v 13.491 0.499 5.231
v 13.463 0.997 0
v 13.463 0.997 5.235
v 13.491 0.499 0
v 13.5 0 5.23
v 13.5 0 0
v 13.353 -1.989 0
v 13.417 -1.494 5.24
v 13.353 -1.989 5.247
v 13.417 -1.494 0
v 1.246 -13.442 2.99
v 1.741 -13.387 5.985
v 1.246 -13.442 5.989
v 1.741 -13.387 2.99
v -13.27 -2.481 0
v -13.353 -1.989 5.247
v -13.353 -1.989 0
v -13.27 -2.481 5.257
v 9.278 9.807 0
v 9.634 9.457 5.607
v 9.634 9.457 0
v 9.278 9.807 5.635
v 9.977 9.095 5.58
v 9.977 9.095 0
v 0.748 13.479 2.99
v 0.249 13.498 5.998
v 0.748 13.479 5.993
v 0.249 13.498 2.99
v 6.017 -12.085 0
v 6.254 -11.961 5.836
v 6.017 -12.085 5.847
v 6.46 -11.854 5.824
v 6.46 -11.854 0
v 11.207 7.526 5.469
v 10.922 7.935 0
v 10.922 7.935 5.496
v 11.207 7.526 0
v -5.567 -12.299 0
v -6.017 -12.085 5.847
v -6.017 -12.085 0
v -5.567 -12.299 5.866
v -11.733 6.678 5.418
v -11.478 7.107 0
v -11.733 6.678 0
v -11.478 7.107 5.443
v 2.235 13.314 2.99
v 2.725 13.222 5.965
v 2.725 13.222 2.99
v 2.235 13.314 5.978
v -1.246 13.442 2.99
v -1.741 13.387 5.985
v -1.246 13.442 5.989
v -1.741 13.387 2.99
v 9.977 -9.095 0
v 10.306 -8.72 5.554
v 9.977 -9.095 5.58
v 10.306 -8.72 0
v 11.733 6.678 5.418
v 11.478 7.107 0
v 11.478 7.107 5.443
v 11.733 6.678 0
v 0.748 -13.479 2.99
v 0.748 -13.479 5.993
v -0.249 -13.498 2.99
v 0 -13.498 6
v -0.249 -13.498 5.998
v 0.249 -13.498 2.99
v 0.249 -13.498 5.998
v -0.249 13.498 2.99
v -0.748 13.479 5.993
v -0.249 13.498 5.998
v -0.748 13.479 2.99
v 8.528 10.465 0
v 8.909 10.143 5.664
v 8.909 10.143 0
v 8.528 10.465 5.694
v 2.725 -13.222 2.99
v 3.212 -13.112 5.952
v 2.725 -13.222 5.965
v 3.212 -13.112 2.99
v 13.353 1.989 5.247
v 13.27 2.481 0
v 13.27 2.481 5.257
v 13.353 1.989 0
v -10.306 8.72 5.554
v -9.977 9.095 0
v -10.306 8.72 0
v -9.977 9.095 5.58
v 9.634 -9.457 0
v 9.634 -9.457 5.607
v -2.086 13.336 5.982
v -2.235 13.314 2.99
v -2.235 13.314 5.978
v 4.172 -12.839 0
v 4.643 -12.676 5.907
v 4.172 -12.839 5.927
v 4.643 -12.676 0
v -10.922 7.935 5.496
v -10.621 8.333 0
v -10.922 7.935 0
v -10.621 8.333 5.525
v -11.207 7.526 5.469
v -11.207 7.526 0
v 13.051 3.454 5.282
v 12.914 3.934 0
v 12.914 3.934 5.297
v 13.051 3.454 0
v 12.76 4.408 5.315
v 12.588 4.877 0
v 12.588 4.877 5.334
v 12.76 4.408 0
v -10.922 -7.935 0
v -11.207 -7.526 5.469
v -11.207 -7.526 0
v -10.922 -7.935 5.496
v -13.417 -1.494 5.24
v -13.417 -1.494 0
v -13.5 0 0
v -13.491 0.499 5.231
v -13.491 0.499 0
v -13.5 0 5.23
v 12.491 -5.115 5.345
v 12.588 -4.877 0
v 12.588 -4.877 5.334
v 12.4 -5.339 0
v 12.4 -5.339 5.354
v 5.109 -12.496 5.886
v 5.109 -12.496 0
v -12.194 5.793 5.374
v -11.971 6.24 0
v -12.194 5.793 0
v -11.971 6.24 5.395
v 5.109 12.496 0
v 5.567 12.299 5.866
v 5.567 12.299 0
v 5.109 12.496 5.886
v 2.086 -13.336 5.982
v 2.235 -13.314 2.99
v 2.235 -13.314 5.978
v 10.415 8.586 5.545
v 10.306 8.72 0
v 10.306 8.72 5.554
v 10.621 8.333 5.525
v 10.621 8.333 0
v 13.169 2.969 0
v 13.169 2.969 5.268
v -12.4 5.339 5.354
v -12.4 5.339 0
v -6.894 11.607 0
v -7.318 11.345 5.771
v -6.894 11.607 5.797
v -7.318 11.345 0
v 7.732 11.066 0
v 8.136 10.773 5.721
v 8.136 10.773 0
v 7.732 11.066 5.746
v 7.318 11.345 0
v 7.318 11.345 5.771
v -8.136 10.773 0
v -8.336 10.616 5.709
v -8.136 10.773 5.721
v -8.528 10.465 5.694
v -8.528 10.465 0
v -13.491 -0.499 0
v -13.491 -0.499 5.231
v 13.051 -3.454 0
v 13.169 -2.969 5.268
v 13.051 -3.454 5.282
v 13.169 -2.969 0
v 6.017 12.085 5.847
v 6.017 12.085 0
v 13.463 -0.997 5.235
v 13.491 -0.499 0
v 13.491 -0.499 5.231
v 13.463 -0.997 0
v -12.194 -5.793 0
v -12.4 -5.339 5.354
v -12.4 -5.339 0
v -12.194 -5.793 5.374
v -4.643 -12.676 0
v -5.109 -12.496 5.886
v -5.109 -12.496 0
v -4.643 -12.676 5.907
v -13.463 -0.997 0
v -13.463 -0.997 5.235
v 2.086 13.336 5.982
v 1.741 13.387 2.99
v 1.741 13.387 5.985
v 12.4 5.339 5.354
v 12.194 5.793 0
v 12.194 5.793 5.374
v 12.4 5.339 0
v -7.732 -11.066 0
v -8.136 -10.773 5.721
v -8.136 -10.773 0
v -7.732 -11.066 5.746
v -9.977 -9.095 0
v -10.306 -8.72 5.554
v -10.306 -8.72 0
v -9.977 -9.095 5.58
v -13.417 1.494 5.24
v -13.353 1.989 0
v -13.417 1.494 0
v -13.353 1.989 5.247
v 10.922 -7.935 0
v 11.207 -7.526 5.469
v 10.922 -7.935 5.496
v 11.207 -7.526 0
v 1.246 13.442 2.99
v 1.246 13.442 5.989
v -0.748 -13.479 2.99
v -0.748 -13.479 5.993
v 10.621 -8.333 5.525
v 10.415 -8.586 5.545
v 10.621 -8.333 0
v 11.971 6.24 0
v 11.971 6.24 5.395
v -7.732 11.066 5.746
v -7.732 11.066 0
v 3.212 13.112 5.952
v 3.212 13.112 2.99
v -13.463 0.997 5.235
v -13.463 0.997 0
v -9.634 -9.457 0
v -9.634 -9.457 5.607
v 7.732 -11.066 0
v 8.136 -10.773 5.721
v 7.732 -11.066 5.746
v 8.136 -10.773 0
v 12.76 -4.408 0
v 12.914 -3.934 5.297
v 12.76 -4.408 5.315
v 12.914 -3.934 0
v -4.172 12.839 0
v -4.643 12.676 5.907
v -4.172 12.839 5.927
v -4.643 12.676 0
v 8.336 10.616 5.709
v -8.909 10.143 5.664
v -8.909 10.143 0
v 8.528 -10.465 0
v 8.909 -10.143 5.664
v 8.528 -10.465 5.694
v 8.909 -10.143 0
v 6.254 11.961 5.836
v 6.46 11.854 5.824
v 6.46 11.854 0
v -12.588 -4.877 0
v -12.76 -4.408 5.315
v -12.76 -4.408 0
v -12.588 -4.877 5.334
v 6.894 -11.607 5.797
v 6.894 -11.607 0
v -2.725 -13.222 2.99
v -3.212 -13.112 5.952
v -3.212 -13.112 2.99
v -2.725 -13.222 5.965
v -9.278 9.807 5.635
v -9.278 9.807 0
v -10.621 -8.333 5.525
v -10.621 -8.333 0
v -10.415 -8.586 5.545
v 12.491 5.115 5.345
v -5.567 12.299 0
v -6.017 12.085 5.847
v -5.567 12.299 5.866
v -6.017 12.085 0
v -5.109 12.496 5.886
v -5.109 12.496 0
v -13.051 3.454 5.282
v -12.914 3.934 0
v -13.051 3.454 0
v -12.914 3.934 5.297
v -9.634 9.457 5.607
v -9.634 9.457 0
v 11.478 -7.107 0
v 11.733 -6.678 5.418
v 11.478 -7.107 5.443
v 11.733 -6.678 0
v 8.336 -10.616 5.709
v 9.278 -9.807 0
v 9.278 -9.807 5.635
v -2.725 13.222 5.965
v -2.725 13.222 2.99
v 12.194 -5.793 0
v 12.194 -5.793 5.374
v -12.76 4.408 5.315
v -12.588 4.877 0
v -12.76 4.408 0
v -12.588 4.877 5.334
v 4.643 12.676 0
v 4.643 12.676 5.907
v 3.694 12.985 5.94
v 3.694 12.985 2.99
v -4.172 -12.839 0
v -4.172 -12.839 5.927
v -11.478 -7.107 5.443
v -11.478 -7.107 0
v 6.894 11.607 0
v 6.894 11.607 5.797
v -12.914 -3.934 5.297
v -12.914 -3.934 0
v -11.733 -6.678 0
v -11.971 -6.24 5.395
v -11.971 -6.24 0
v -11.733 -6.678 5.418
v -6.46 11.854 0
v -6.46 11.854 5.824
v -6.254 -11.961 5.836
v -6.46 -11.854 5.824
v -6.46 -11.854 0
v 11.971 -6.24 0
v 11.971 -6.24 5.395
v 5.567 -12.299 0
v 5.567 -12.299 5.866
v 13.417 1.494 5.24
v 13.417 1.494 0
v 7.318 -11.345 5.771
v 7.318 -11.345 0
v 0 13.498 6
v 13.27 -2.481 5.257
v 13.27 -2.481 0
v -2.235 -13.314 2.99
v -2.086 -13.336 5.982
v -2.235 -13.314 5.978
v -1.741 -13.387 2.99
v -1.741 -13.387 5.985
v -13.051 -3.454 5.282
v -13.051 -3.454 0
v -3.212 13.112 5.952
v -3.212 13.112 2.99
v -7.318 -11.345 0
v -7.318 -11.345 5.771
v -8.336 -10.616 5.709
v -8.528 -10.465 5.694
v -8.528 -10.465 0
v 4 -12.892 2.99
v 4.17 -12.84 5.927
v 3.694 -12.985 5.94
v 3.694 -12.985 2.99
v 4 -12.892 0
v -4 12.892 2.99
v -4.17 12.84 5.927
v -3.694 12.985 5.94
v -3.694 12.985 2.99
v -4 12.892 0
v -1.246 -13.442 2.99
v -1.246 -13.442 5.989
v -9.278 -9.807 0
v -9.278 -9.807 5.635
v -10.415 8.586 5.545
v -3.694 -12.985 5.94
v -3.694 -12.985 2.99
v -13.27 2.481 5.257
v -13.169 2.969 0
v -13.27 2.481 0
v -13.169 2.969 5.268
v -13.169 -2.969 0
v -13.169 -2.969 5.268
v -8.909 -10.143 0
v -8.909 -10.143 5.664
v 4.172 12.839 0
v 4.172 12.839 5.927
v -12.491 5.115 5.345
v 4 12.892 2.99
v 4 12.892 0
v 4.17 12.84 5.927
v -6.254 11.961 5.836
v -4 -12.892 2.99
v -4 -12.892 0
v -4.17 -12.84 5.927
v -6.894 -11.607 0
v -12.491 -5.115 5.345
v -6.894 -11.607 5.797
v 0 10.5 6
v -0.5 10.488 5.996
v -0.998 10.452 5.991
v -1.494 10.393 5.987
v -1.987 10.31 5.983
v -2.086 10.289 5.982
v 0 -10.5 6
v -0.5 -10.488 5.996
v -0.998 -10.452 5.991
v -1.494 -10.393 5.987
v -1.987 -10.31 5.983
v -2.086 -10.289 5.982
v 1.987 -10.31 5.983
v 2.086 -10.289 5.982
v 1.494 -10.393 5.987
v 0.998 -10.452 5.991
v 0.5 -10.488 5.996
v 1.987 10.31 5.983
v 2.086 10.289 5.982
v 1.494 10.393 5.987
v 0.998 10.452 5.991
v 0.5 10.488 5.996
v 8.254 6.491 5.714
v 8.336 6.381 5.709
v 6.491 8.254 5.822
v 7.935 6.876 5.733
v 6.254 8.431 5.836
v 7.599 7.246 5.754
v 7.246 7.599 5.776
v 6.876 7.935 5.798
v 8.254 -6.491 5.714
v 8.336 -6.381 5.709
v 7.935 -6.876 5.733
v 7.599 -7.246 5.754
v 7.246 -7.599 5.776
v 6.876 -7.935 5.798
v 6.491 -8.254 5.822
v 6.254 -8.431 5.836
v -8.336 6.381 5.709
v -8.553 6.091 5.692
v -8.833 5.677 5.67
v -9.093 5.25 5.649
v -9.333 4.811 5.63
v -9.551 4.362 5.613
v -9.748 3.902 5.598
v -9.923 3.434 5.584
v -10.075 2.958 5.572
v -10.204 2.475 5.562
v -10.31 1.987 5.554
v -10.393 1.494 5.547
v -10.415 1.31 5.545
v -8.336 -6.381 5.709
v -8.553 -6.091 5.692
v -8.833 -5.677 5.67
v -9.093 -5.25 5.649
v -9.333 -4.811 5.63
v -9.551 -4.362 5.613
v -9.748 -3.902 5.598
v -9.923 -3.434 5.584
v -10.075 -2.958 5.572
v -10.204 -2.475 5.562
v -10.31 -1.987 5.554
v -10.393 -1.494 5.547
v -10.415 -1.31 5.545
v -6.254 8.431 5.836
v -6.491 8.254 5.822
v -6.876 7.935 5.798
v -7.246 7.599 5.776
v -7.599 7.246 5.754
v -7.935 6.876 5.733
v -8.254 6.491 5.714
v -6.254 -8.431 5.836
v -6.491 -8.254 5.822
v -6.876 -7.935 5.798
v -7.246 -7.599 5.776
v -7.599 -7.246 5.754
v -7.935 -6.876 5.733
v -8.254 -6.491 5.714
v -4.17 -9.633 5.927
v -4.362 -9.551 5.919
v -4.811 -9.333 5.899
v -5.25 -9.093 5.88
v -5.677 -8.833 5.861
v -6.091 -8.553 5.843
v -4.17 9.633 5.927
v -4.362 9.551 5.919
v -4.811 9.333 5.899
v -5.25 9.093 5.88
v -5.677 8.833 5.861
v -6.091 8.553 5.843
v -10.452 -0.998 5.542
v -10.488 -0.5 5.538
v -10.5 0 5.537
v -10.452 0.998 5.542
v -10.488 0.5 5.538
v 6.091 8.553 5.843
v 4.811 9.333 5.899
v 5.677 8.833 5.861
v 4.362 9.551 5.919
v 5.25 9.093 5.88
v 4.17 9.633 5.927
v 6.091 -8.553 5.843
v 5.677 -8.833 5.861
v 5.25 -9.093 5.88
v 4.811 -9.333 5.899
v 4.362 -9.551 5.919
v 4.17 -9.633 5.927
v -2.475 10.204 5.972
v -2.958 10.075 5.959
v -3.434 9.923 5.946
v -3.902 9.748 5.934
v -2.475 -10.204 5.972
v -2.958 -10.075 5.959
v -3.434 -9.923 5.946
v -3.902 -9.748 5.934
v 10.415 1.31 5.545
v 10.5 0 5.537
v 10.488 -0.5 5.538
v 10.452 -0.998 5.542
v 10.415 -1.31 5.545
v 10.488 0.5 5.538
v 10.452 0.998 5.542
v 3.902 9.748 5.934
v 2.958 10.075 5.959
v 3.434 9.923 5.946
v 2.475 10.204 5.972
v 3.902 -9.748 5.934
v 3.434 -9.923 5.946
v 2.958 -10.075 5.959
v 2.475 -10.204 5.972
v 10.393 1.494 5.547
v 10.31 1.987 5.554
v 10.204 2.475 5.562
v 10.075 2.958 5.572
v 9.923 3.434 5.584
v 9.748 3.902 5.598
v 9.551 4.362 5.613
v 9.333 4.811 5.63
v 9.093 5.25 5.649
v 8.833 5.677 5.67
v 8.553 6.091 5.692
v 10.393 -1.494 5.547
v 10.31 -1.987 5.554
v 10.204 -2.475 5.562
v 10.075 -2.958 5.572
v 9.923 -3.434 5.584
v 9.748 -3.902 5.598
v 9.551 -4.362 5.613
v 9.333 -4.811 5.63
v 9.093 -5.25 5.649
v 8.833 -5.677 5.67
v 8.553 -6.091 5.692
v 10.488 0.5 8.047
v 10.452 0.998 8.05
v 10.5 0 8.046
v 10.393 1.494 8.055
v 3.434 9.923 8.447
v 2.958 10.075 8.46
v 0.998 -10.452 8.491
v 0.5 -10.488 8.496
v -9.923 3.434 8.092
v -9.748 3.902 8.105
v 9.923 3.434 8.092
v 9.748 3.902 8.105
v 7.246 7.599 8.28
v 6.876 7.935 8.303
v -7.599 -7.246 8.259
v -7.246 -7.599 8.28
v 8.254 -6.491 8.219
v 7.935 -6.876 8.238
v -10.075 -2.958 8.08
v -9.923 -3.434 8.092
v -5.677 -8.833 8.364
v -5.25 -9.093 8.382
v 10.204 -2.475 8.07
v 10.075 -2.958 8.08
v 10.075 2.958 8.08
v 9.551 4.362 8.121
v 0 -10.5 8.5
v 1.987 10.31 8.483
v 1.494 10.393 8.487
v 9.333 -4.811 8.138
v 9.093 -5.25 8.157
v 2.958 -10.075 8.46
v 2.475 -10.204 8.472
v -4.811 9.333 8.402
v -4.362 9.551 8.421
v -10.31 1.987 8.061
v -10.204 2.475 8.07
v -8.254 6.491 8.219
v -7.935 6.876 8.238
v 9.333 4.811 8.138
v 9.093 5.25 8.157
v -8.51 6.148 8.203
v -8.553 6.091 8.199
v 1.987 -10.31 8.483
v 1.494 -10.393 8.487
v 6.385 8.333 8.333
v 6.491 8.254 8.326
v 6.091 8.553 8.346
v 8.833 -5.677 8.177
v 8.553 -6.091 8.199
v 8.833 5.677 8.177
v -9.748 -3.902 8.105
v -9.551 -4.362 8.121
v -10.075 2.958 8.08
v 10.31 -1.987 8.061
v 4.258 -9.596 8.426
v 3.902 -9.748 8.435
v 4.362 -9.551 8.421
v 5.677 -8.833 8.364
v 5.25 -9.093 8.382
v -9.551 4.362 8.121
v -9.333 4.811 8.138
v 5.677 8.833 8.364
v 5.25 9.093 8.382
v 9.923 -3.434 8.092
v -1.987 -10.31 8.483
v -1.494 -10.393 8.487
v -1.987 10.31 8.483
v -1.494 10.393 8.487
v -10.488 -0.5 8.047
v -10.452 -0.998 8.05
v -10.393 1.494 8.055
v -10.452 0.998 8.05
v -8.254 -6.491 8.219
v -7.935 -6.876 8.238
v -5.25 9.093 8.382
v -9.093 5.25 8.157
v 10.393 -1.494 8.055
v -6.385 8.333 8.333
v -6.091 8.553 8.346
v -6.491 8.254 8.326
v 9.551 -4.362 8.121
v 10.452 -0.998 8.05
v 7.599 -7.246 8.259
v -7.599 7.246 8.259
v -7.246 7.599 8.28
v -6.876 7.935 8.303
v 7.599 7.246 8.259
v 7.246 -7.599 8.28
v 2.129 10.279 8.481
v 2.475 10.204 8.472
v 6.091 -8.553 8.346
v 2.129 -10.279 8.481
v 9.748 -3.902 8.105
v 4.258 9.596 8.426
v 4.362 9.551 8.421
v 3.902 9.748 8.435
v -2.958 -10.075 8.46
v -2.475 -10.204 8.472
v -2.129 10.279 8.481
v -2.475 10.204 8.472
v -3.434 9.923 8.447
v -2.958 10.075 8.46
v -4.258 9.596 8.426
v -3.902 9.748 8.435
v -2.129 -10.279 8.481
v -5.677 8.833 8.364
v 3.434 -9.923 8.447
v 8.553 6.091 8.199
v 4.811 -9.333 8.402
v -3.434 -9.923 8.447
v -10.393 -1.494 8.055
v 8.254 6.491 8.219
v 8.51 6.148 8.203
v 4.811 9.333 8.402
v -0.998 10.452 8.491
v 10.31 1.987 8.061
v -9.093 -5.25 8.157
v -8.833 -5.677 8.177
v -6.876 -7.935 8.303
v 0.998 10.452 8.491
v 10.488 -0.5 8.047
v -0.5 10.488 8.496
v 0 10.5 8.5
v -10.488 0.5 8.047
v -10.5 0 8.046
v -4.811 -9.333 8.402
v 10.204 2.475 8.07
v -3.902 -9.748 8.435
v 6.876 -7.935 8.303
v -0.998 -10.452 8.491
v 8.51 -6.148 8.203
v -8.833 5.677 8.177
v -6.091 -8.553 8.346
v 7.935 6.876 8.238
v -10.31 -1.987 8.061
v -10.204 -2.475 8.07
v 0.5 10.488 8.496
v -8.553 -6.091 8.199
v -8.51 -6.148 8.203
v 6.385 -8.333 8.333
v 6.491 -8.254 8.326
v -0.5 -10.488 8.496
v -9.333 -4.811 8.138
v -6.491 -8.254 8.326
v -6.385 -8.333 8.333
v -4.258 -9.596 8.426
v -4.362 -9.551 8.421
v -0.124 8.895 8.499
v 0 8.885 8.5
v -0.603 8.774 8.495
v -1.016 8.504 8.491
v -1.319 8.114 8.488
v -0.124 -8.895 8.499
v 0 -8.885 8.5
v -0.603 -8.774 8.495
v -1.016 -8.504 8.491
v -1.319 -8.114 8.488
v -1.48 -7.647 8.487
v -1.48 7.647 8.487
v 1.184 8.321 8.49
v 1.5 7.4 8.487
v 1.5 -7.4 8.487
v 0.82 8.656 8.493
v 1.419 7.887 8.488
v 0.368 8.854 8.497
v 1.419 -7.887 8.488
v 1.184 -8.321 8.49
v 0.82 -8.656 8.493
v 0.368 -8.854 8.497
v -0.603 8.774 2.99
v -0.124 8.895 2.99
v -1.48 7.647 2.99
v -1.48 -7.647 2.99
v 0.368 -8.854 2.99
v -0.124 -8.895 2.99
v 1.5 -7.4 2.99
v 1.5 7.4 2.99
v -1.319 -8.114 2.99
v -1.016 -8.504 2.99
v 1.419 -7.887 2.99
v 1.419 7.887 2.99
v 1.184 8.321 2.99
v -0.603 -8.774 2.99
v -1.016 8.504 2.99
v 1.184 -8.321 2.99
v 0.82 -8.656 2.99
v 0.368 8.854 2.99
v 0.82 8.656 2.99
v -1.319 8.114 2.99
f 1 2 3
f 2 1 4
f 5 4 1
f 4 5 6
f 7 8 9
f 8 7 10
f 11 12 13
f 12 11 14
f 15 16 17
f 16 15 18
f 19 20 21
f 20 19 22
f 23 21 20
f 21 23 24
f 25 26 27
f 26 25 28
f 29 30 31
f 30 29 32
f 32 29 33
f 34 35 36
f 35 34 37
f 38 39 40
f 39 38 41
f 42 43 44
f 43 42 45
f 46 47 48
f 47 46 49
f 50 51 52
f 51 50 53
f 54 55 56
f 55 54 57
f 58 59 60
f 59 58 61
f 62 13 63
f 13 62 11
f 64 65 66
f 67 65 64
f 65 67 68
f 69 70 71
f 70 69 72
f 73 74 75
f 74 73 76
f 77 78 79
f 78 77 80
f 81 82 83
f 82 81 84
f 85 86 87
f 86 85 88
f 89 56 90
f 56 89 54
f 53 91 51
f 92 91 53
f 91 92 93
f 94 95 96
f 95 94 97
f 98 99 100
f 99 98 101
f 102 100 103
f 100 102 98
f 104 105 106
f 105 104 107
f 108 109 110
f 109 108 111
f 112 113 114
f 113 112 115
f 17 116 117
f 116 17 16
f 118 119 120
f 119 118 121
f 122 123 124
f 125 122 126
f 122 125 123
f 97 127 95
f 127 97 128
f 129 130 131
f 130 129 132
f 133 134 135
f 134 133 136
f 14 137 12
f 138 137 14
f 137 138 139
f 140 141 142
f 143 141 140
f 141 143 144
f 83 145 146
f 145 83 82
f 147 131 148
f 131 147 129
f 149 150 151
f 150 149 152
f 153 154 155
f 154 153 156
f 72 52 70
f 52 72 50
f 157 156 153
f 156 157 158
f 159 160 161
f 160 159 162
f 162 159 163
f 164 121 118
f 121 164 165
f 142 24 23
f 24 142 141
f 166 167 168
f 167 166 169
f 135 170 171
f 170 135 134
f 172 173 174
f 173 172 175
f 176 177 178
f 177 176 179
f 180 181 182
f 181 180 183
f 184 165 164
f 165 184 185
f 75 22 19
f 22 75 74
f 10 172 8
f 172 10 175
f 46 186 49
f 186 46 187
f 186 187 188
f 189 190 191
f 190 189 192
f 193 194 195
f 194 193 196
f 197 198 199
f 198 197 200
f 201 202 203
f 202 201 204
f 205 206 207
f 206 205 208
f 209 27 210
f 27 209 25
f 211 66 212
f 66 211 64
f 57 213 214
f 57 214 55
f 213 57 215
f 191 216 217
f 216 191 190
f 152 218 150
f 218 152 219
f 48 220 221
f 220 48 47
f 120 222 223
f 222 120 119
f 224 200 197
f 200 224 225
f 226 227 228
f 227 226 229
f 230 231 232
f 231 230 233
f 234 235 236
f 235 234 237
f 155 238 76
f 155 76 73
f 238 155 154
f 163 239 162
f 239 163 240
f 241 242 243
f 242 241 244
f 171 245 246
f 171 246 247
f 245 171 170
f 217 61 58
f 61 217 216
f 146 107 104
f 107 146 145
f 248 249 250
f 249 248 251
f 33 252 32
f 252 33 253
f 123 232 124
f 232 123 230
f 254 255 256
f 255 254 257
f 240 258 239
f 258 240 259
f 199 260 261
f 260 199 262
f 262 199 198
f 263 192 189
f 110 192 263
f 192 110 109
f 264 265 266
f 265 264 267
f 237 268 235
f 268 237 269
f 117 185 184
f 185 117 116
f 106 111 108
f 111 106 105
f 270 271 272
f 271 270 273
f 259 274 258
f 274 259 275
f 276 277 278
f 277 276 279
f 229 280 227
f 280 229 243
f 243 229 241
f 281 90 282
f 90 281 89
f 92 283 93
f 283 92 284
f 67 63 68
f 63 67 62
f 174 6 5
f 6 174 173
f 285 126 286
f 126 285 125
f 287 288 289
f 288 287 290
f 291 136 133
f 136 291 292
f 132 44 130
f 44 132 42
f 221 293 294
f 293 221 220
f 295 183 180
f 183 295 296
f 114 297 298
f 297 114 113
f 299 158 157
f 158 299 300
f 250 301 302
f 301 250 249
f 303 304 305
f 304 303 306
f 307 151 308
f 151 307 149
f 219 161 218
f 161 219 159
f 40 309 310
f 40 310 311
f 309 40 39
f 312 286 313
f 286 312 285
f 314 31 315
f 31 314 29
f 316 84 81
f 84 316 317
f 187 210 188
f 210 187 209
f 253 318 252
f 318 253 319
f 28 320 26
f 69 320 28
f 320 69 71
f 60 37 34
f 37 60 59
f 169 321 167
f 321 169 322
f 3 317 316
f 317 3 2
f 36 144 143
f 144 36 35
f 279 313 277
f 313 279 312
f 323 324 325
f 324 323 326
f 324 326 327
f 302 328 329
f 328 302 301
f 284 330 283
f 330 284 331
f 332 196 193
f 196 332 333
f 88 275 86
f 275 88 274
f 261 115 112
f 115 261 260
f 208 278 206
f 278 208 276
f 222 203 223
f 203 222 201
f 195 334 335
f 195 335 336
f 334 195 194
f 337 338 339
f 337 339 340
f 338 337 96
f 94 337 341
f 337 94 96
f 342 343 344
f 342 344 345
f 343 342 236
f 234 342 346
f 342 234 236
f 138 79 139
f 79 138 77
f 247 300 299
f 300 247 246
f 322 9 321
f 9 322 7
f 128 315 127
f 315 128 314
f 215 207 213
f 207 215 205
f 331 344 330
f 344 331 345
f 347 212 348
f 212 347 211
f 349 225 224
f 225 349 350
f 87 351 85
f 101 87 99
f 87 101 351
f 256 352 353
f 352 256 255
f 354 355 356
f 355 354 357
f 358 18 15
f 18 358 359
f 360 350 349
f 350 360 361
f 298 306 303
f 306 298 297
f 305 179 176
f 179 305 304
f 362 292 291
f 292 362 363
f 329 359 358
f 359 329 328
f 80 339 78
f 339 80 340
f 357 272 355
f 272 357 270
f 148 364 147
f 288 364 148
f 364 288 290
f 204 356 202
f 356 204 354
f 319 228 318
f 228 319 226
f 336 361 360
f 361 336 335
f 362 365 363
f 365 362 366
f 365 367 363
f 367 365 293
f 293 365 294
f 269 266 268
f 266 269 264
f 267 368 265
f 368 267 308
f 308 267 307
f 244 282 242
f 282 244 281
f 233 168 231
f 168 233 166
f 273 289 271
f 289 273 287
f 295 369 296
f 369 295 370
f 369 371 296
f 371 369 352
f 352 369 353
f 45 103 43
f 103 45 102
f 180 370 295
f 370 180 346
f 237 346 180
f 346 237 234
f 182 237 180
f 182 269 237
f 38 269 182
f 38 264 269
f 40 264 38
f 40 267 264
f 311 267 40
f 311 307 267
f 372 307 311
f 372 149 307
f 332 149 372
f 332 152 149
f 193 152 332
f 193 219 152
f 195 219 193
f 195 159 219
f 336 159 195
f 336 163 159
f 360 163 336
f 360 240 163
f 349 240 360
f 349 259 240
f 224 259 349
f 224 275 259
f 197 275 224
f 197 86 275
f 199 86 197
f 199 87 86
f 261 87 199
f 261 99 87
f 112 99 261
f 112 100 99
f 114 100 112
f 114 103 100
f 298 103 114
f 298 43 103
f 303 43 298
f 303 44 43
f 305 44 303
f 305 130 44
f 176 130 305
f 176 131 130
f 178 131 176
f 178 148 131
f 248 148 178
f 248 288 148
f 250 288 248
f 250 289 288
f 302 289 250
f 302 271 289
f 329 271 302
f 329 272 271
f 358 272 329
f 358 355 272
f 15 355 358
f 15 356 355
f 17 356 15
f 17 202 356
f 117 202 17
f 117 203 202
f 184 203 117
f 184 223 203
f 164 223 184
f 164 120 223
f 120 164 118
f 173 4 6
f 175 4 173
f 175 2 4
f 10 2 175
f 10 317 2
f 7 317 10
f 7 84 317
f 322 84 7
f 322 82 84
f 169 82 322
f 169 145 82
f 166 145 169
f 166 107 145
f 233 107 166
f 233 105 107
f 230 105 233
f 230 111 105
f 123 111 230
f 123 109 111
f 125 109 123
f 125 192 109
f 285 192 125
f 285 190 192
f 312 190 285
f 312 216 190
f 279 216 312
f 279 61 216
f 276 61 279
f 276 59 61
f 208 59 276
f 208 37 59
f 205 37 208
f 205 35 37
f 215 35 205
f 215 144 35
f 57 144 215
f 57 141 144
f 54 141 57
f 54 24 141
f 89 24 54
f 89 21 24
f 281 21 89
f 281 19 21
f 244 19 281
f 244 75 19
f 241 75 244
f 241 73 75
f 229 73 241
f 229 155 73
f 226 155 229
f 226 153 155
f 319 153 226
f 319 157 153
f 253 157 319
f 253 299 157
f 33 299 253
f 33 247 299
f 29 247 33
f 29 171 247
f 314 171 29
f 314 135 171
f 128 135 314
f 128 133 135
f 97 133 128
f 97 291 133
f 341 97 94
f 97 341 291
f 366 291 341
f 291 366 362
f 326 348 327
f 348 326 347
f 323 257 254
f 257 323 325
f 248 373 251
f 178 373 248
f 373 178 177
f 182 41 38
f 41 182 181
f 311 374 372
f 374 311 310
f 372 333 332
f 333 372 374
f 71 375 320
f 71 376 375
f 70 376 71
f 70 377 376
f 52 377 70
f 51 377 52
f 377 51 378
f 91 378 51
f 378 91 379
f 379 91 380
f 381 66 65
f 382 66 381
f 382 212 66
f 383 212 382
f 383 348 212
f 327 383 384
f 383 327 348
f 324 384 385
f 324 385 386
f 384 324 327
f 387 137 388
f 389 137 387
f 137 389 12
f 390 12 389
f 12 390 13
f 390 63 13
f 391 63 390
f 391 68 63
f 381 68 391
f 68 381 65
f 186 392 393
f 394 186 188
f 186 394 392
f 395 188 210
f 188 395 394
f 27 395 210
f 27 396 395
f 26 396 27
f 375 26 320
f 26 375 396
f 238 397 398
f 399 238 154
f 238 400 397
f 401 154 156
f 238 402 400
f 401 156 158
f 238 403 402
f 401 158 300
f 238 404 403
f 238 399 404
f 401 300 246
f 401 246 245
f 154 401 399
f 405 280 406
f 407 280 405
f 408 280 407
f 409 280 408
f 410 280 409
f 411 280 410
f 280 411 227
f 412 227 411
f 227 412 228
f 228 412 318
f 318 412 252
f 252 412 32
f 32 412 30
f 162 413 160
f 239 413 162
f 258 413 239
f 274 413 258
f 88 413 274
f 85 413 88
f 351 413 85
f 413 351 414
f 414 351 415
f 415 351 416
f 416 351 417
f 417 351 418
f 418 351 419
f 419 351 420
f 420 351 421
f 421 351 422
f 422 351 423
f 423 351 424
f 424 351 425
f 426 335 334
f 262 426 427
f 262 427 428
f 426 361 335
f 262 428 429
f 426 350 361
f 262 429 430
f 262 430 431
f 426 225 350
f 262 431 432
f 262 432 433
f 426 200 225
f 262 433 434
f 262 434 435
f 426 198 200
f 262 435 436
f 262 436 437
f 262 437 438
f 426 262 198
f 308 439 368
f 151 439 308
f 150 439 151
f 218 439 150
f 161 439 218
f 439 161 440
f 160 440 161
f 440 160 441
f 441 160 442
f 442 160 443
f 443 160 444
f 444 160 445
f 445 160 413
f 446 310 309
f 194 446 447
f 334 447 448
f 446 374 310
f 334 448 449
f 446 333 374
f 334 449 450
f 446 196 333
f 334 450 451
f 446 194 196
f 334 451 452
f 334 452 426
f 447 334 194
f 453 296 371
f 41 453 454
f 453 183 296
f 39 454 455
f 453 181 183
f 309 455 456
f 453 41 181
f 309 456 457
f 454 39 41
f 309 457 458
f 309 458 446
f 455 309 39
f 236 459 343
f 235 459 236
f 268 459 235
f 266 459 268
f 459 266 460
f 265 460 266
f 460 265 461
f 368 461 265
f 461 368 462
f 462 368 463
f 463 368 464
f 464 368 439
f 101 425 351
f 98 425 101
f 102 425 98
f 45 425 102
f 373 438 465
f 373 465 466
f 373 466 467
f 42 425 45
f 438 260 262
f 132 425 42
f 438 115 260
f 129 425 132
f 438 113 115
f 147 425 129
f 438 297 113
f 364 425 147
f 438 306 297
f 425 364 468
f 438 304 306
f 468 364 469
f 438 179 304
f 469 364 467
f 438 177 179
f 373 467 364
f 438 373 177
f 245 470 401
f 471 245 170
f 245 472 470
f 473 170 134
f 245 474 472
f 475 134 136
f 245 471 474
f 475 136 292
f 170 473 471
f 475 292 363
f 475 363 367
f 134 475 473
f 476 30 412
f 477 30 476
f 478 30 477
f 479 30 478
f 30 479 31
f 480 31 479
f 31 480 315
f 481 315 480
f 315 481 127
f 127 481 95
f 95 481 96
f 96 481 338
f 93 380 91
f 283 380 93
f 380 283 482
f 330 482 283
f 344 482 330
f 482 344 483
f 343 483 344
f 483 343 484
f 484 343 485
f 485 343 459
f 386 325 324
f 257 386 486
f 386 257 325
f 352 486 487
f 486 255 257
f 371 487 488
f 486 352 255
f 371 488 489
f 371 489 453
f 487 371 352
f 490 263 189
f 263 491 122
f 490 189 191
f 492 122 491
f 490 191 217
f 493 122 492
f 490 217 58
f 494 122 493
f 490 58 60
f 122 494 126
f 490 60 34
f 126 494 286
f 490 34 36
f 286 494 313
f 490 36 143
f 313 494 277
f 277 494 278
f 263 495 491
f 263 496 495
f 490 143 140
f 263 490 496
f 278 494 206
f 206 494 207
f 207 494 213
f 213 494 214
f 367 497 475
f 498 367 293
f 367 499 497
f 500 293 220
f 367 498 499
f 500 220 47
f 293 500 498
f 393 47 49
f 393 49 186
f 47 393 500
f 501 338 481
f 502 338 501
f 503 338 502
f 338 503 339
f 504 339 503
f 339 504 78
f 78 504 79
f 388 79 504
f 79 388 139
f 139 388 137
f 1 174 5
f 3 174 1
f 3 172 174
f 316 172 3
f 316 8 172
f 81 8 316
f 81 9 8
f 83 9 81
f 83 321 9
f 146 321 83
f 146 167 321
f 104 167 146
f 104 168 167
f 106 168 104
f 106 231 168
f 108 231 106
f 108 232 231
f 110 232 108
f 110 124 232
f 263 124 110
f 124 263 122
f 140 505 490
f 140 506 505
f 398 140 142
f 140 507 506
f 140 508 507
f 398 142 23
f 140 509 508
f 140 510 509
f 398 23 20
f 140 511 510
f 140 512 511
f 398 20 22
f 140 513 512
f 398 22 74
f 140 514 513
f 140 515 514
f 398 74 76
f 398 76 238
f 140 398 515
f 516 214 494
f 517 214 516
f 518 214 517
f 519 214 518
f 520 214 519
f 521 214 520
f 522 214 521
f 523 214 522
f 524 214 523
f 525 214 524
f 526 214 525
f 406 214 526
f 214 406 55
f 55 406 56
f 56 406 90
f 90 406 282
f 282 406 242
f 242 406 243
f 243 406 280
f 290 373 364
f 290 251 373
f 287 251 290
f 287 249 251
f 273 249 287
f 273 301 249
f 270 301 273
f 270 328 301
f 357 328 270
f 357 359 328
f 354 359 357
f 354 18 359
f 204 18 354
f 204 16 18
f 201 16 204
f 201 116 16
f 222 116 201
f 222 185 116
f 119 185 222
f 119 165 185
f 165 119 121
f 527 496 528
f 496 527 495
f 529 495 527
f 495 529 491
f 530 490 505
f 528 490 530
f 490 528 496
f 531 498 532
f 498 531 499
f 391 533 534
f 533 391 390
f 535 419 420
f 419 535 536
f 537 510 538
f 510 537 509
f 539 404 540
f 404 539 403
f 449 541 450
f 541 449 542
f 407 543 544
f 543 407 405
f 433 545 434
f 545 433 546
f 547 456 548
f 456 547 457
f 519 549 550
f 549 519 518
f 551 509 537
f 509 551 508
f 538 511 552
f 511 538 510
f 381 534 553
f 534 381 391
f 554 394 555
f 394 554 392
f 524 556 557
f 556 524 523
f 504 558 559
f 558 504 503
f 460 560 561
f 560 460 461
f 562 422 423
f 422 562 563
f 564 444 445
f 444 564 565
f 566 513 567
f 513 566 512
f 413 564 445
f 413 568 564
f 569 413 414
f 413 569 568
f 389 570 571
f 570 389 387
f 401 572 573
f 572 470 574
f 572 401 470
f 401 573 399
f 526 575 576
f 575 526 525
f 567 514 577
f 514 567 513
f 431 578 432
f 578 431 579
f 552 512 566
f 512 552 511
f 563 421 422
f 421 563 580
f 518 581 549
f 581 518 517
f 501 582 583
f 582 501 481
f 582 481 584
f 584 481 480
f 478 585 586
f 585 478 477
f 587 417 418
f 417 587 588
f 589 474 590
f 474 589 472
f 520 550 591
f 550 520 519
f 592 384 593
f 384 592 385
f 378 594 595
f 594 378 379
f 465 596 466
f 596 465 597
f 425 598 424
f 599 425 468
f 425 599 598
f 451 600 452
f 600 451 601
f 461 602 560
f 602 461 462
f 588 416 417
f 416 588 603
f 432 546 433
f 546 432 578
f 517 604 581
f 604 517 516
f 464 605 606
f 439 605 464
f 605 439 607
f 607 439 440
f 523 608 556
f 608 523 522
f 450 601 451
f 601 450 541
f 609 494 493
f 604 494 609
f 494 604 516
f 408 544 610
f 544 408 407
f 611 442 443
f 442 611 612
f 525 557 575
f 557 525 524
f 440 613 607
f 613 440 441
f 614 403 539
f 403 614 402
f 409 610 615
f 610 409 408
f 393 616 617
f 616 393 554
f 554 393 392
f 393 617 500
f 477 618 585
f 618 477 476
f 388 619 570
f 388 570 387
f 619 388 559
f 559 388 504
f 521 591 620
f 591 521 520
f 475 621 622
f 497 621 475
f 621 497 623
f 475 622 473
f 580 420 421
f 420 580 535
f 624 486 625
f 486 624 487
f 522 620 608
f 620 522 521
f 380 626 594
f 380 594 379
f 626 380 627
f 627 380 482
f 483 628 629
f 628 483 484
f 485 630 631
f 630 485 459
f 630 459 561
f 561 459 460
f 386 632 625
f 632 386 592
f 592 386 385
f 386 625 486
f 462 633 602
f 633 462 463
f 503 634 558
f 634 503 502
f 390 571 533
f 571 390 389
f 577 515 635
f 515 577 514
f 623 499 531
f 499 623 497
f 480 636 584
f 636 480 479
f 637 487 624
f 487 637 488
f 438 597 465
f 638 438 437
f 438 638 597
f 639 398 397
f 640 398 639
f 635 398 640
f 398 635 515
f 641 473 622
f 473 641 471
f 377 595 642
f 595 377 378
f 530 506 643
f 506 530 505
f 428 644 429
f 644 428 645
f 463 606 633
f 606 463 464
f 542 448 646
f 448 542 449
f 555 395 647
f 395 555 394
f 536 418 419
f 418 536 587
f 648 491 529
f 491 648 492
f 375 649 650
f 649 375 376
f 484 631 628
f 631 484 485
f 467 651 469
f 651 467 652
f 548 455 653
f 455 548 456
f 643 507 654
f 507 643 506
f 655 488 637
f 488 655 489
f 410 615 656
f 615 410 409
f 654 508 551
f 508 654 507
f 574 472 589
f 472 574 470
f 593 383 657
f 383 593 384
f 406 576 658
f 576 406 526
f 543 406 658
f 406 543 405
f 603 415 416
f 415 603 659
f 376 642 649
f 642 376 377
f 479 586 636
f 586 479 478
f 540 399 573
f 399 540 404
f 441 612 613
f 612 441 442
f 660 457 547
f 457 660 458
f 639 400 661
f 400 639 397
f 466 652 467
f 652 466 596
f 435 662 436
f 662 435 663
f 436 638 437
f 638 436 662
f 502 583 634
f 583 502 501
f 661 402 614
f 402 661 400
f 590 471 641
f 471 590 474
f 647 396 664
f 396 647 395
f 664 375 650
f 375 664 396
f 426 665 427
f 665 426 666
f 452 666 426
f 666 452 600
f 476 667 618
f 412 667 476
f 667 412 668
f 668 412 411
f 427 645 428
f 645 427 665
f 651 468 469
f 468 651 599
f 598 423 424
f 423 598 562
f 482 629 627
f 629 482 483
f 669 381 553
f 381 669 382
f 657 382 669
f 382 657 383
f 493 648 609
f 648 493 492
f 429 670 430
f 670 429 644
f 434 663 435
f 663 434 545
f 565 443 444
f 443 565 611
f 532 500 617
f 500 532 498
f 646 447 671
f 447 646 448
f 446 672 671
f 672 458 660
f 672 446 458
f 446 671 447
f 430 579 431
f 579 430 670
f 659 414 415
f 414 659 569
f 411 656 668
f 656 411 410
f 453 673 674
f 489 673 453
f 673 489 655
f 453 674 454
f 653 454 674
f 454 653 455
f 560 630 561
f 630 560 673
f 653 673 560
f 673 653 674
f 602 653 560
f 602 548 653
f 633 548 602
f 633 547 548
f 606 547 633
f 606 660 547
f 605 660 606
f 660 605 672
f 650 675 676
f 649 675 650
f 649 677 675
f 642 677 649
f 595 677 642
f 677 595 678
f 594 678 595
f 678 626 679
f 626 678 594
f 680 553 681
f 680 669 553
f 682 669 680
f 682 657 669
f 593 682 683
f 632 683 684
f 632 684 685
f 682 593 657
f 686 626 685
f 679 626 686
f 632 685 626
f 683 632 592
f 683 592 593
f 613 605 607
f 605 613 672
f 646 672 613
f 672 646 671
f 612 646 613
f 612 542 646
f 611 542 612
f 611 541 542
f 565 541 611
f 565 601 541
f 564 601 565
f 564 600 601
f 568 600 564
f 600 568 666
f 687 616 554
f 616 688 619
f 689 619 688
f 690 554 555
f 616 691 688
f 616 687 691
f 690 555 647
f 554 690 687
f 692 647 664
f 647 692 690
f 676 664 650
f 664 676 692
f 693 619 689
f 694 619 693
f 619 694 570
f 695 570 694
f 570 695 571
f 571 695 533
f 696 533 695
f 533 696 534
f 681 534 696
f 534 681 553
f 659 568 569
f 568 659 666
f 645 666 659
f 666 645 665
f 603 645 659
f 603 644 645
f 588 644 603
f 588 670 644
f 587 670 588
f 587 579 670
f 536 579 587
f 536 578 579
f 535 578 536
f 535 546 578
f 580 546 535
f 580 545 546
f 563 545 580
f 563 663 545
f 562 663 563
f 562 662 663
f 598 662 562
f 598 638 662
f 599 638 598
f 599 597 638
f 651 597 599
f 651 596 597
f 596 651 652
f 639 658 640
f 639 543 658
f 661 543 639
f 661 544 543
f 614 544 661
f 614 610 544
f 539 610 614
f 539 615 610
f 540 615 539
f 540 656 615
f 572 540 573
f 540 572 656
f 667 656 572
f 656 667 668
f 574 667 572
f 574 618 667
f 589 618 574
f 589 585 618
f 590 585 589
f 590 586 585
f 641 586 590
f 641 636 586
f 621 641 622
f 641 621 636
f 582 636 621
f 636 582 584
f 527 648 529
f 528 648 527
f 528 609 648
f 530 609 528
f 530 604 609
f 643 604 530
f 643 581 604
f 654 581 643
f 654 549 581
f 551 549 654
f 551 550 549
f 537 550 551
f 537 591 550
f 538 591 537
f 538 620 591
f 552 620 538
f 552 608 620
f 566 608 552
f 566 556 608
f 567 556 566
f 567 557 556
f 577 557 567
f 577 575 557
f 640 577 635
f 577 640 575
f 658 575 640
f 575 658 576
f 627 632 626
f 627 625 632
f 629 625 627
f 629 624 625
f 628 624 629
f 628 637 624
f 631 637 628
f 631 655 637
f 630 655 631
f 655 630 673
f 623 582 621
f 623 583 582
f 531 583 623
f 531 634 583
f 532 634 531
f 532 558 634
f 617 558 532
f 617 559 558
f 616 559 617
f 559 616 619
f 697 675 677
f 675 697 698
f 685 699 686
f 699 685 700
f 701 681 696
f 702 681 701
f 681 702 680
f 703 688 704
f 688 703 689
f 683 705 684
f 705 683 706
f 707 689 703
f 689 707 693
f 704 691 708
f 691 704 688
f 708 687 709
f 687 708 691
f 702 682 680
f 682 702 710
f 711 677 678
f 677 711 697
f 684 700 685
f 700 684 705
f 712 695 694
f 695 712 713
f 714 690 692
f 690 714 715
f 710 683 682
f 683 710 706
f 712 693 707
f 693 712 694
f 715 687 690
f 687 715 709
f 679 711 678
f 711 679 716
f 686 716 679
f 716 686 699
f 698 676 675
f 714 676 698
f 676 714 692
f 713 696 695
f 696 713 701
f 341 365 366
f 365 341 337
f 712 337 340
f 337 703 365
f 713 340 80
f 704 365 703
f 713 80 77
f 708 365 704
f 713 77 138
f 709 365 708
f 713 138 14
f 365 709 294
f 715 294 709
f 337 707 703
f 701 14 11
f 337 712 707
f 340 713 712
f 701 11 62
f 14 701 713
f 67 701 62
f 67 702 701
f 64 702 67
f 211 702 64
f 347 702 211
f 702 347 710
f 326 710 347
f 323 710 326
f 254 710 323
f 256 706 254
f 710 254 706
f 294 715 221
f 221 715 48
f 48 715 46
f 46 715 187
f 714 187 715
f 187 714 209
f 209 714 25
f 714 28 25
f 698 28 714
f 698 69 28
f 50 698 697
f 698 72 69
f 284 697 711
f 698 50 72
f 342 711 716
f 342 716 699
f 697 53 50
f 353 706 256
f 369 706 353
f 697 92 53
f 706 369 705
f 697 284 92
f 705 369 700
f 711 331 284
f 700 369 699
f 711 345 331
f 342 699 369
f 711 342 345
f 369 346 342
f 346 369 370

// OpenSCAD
$fa=1/1;
$fs=1/2;
bissl=1/100;
part="inner";//[inner,outer,all_visualize]
od_tamb=251;//tambourine rim outer diameter
id_tamb=239;//tambourine rim inner diameter
wall_tamb=(od_tamb-id_tamb)/2; //tambourine wall
hole_tamb=23; //holding hole in the rim
lip=3; //extra plastic that hols to the hole
air=1; //wiggle room
hole=3; //diameter for screw hole
beam_width=7; //slit in inner part of mount to hod the beam
wall=1.6;//thinnest part in the mount, namely the slit to tune the beam mounting height
module inner_mount() {
  difference() {
    union() {
      intersection() {
        cylinder(d=hole_tamb+2*lip-2*air,h=2*lip+wall_tamb);
        translate([0,0,-id_tamb/2+2*lip])rotate([90,0,0])cylinder(d=id_tamb,h=hole_tamb+2*lip,center=true);
      }
      intersection() {
        cylinder(d=hole_tamb-2*air,h=2*lip+wall_tamb);
        translate([0,0,-id_tamb/2+2*lip])rotate([90,0,0])cylinder(d=id_tamb+wall_tamb-air,h=hole_tamb+2*lip,center=true);
      }
    }
    hull() {
      translate([0,hole_tamb/2-air-hole/2-wall,-bissl])cylinder(h=wall_tamb+3*lip+2*bissl,d=hole);
      translate([0,-hole_tamb/2+air+hole/2+wall,-bissl])cylinder(h=wall_tamb+3*lip+2*bissl,d=hole);
    }
    translate([-beam_width/2-air/2,-hole_tamb/2-lip,-bissl]) cube([beam_width+air,hole_tamb+2*lip,lip]);
  }
}
module outer_mount() {
  difference() {
    union() {
      difference(){
        cylinder(d=hole_tamb+2*lip-2*air,h=2*lip+wall_tamb);
        translate([0,0,od_tamb/2+lip])rotate([90,0,0])cylinder(d=od_tamb,h=hole_tamb+2*lip,center=true);
      }
      difference(){
        cylinder(d=hole_tamb-2*air,h=2*lip+wall_tamb);
        translate([0,0,od_tamb/2+lip])rotate([90,0,0])cylinder(d=od_tamb-wall_tamb+air,h=hole_tamb+2*lip,center=true);
      }
    }
    hull() {
      translate([0,hole_tamb/2-air-hole/2-wall,-bissl])cylinder(h=wall_tamb+3*lip+2*bissl,d=hole);
      translate([0,-hole_tamb/2+air+hole/2+wall,-bissl])cylinder(h=wall_tamb+3*lip+2*bissl,d=hole);
    }
  }
}
if (part=="inner") inner_mount();
if (part=="outer") outer_mount();
if (part=="all_visualize") {
  inner_mount();
  translate([0,0,wall_tamb+3*lip])rotate([180,0,0])outer_mount();
}
